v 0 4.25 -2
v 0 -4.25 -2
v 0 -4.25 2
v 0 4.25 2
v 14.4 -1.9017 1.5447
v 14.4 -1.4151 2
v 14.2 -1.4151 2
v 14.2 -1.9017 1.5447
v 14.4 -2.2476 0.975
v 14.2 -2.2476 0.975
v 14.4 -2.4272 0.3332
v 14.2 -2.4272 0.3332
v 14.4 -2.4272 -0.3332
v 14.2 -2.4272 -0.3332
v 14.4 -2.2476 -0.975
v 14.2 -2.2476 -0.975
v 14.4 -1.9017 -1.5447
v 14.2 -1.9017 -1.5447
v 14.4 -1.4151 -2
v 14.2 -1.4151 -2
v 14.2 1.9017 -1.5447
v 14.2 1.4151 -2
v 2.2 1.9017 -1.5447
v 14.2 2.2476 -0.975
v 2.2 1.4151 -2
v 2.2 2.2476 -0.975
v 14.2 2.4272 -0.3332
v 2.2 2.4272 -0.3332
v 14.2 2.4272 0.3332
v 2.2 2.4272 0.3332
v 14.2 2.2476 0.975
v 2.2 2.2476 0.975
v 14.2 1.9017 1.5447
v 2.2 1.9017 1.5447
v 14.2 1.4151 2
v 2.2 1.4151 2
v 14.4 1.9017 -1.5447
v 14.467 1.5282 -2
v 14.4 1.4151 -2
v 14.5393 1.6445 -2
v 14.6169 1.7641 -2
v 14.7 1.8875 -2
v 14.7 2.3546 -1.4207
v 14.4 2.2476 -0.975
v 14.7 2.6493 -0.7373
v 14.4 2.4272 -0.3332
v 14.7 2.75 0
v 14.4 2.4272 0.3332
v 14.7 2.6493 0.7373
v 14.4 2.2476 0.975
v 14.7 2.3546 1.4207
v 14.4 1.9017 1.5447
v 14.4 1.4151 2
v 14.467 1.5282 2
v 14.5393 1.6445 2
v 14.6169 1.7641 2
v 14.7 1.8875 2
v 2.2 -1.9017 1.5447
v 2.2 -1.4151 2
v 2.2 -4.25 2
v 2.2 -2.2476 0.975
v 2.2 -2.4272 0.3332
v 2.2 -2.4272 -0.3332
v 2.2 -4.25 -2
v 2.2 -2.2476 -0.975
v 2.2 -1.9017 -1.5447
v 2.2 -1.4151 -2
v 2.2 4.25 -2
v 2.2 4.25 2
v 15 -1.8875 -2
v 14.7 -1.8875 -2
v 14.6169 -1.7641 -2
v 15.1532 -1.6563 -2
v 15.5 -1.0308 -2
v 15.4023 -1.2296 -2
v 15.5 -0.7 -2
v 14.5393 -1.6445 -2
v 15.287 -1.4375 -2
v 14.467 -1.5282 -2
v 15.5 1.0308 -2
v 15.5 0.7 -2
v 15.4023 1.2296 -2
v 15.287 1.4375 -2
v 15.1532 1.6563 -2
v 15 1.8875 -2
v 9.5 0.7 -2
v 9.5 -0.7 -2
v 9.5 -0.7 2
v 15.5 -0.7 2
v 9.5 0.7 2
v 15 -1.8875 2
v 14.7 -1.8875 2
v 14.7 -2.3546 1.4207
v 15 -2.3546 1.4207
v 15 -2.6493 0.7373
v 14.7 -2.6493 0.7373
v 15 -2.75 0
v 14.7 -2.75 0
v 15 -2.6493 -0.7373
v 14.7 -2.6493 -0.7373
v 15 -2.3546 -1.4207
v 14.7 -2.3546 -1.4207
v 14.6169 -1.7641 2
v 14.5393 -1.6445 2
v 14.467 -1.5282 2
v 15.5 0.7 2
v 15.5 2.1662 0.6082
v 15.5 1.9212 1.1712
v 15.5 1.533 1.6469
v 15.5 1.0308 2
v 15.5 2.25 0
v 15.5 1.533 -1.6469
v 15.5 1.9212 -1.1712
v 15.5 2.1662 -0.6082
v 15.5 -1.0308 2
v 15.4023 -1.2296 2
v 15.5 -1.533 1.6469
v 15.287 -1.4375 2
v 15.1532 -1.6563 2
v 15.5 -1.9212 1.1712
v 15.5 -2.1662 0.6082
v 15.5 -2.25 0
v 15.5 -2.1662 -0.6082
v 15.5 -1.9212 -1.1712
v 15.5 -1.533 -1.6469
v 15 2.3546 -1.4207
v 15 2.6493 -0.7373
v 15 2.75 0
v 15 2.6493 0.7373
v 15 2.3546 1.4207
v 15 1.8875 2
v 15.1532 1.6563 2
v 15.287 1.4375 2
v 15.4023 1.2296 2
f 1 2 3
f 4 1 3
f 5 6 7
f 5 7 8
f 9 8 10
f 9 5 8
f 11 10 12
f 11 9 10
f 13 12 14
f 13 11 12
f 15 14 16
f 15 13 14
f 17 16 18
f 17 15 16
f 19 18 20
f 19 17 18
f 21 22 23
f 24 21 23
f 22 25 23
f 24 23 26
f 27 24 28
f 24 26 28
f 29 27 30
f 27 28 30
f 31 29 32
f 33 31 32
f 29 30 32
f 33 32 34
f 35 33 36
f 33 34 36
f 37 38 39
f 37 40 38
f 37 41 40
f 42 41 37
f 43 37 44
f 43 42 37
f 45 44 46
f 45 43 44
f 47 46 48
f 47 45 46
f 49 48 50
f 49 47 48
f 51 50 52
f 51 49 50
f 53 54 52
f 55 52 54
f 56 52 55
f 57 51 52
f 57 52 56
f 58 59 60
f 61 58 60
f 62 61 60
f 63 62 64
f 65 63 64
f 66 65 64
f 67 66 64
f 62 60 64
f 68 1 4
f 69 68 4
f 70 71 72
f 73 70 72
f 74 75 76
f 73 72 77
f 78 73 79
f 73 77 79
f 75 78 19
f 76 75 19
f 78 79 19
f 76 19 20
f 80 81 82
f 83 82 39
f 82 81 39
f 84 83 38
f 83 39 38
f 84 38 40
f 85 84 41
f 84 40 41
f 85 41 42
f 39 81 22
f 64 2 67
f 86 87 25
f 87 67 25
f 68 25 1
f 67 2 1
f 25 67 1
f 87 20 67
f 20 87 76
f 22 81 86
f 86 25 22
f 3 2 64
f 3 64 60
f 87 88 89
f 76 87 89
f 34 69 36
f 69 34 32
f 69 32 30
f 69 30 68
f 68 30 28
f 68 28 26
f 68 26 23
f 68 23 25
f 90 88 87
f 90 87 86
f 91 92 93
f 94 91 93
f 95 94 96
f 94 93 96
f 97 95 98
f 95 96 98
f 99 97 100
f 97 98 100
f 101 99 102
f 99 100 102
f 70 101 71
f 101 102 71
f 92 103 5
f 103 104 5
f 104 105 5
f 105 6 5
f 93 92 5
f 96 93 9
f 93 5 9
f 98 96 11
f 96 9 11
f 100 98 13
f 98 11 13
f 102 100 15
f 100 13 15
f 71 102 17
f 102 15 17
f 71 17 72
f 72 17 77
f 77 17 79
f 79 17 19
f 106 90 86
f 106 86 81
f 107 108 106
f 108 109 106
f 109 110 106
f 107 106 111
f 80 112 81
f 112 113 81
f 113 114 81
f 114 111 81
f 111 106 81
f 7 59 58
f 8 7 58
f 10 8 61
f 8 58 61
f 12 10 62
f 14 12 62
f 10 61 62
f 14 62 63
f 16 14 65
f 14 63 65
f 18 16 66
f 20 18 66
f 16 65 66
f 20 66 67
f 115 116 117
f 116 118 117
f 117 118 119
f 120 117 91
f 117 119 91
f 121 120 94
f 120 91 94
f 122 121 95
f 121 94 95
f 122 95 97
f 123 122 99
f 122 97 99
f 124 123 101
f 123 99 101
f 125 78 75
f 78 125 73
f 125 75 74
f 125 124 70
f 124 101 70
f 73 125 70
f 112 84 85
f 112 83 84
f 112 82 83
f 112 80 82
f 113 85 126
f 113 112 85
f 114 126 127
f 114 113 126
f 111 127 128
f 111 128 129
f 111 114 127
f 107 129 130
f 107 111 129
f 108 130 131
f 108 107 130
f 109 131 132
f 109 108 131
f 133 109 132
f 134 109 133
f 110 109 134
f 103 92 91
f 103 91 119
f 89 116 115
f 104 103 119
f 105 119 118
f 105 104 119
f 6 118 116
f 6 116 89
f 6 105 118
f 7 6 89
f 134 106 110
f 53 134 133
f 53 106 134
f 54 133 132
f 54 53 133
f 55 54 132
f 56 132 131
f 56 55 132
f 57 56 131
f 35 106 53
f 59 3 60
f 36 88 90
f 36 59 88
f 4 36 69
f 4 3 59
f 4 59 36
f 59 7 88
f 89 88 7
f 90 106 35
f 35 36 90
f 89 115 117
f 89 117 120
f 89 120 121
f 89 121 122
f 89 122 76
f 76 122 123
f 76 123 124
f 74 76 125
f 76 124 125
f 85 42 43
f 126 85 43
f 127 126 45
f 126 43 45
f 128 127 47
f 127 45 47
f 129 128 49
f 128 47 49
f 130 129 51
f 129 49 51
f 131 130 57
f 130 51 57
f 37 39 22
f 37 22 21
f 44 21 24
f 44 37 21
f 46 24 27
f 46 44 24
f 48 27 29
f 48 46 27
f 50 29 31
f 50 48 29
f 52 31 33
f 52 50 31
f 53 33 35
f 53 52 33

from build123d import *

# Parameters (mm, degrees)
F3_W         = 38.5
F3_H         = 34
F3_W_2       = 8.5
F3_H_2       = 4
F4_DEPTH     = 15.501
F5_T4_ANGLE  = 146.9201983829
F5_S5_R      = 2.45
F5_T6_DEPTH  = 4
F5_T10_ANGLE = 146.9201983829
F5_S11_R     = 2.45
F5_T12_DEPTH = 4
F5_T14_ANGLE = 146.9201983829
F5_T16_ANGLE = 146.9201983829
F6_W         = 6
F6_H         = 1.4
F7_DEPTH     = 4.001


# Not quite as in the source:
# - a fillet or chamfer that OpenCascade refuses, or shapes differently, is made with other operations: its cross-section is extruded or revolved along the edge and cut away or added


with BuildPart() as f2:
    # F1 (on Front) → F2 (revolve)
    with BuildSketch(Plane.XZ):
        Polygon((0, 7.5), (0, 0), (15.5, 0), (15.5, 2.75), (14.2, 2.75), (14.2, 2.45), (2.2, 2.45), (2.2, 7.5), align=None)
    revolve(axis=Axis((8.8834212145, 0, 0), (1, 0, 0)))

    # F3 (on Right) → F4 (cut, through all)
    with BuildSketch(Plane.YZ):
        Rectangle(F3_W, F3_H)
        Rectangle(F3_W_2, F3_H_2, mode=Mode.SUBTRACT)
    extrude(amount=F4_DEPTH, mode=Mode.SUBTRACT)

    # F5: chamfer of 0.5 on 4 edges, made by hand


with BuildPart() as f5_tool2:
    # F5_s3 → F5_t4 (revolve)
    with BuildSketch(Plane(origin=(0, 0, 0), x_dir=(1, 0, 0), z_dir=(0, -0.958621714, -0.2846829983))):
        Polygon((14.2, -2.25), (14.7, -2.75), (14.2, -2.75), align=None)
    revolve(axis=Axis((14.2, 0, 0), (1, 0, 0)), revolution_arc=F5_T4_ANGLE)

    # F5_s5 → F5_t6 (cut, symmetric)
    with BuildSketch(Plane.YZ.offset(14.4)):
        Circle(F5_S5_R)
    extrude(amount=F5_T6_DEPTH, both=True, mode=Mode.SUBTRACT)


with BuildPart() as f2_1:
    add(f2.part)

    # F5_t1: cut F5_tool2
    add(f5_tool2.part, mode=Mode.SUBTRACT)


with BuildPart() as f5_tool8:
    # F5_s9 → F5_t10 (revolve)
    with BuildSketch(Plane(origin=(0, 0, 0), x_dir=(1, 0, 0), z_dir=(0, 0.958621714, 0.2846829983))):
        Polygon((14.7, -2.75), (14.2, -2.25), (14.2, -2.75), align=None)
    revolve(axis=Axis((14.2, 0, 0), (1, 0, 0)), revolution_arc=F5_T10_ANGLE)

    # F5_s11 → F5_t12 (cut, symmetric)
    with BuildSketch(Plane.YZ.offset(14.4)):
        Circle(F5_S11_R)
    extrude(amount=F5_T12_DEPTH, both=True, mode=Mode.SUBTRACT)


with BuildPart() as f2_2:
    add(f2_1.part)

    # F5_t7: cut F5_tool8
    add(f5_tool8.part, mode=Mode.SUBTRACT)

    # F5_s13 → F5_t14 (revolve, cut)
    with BuildSketch(Plane(origin=(0, 0, 0), x_dir=(1, 0, 0), z_dir=(0, -0.958621714, -0.2846829983))):
        Polygon((15, -2.75), (15.5, -2.25), (15.5, -2.75), align=None)
    revolve(axis=Axis((15.5, 0, 0), (1, 0, 0)), revolution_arc=F5_T14_ANGLE, mode=Mode.SUBTRACT)

    # F5_s15 → F5_t16 (revolve, cut)
    with BuildSketch(Plane(origin=(0, 0, 0), x_dir=(1, 0, 0), z_dir=(0, 0.958621714, 0.2846829983))):
        Polygon((15.5, -2.25), (15, -2.75), (15.5, -2.75), align=None)
    revolve(axis=Axis((15.5, 0, 0), (1, 0, 0)), revolution_arc=F5_T16_ANGLE, mode=Mode.SUBTRACT)

    # F6 (on face) → F7 (cut, through all)
    with BuildSketch(Plane.XY.offset(2)):
        with Locations((12.5, 0)):
            Rectangle(F6_W, F6_H)
    extrude(amount=-F7_DEPTH, mode=Mode.SUBTRACT)


solid = f2_2.part
